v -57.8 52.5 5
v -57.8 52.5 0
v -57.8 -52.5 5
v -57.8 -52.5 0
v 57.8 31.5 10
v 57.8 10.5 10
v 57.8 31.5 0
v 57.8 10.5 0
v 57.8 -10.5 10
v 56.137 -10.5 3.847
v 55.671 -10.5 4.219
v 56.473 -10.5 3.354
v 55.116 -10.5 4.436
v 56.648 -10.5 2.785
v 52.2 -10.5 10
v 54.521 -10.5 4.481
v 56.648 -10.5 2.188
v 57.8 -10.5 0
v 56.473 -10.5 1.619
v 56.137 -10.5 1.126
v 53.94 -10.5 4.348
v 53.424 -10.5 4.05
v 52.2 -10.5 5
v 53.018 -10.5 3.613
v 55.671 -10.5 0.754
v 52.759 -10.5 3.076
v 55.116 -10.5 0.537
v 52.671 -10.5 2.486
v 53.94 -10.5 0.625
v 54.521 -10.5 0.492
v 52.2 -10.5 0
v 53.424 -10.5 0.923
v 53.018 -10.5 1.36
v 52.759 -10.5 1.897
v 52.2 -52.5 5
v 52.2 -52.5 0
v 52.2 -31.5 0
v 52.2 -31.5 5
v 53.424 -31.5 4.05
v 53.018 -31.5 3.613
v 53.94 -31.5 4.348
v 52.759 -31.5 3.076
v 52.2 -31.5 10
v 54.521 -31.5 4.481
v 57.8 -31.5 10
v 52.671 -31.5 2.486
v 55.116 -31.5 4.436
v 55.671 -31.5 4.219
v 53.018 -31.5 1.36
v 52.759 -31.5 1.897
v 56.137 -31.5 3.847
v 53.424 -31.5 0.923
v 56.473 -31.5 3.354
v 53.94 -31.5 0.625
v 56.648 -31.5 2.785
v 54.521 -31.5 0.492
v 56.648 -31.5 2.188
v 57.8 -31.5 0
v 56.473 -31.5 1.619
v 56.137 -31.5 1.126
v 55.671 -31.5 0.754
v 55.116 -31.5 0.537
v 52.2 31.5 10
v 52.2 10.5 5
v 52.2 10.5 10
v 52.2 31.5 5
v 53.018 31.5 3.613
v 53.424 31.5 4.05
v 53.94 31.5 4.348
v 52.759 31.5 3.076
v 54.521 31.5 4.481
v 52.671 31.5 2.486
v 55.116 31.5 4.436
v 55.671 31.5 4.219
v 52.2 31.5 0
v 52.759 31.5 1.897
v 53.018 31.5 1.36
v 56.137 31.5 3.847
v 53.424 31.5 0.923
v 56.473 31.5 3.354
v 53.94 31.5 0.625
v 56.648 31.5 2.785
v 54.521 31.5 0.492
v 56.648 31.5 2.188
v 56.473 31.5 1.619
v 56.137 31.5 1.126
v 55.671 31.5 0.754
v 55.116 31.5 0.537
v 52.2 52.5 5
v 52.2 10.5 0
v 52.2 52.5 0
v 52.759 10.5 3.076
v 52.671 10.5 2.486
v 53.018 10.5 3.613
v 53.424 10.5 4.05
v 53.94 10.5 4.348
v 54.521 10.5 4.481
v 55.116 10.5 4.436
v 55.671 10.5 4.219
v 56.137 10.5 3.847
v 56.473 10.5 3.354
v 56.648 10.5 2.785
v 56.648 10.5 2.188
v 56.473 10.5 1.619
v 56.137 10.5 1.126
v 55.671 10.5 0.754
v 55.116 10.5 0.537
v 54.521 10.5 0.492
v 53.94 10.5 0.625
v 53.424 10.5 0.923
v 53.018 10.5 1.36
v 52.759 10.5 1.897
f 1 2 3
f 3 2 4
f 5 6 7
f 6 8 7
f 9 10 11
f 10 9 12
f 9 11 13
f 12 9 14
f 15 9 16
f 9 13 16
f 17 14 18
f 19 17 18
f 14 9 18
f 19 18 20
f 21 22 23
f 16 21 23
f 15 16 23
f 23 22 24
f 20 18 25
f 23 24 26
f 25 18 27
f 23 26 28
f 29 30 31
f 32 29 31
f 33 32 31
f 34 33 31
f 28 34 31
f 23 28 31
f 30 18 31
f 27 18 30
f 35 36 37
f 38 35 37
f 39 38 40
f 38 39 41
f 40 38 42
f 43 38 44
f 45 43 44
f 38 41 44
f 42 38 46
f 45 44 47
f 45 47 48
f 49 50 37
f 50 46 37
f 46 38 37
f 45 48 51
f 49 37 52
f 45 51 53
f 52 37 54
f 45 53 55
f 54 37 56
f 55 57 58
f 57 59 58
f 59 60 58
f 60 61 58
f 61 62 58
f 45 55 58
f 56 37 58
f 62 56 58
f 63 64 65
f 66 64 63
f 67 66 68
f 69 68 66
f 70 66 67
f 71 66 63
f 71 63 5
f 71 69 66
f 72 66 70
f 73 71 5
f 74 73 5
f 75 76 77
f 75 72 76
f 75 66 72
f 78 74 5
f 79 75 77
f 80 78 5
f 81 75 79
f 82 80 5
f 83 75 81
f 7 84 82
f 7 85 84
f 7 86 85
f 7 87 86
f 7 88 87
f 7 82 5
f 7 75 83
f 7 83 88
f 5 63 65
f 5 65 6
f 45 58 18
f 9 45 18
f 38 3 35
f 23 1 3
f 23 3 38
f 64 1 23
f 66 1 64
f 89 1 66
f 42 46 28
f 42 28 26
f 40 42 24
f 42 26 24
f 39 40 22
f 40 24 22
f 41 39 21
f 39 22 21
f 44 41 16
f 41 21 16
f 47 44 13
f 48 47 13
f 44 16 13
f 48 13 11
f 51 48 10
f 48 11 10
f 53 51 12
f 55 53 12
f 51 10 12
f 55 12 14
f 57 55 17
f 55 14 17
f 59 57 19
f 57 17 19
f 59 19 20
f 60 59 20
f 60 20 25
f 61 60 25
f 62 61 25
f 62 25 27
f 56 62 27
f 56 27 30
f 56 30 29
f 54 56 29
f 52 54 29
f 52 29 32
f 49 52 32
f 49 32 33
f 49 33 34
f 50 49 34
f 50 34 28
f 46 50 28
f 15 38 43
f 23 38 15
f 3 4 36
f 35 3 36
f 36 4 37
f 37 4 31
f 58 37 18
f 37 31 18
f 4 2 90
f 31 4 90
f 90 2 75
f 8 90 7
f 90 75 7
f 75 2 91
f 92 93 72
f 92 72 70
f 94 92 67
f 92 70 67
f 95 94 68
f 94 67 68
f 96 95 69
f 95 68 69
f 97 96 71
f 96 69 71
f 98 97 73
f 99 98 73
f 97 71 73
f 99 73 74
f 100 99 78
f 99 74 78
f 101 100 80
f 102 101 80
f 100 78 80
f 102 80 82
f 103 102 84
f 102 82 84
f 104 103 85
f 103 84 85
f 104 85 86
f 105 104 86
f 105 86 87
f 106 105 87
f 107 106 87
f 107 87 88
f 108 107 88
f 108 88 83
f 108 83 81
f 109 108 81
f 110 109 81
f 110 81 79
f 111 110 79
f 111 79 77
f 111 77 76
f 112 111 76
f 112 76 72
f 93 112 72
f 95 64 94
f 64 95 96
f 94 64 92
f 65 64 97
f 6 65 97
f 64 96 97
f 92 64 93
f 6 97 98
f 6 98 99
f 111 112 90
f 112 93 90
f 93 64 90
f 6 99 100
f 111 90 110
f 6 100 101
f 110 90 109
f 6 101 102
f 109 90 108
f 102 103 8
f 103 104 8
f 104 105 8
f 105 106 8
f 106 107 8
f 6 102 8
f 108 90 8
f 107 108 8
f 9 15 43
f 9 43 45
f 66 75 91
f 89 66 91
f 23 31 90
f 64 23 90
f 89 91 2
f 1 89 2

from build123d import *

# Parameters (mm, degrees)
F1_DEPTH = 5
F3_D     = 4
F4_W     = 5.6
F4_H     = 21
F5_DEPTH = 5


with BuildPart() as f1:
    # F0 (on Top) → F1 (new body)
    with BuildSketch(Plane.XY):
        Polygon((52.2, 31.5), (52.2, 52.5), (-57.8, 52.5), (-57.8, -52.5), (52.2, -52.5), (52.2, -31.5), (57.8, -31.5), (57.8, -10.5), (52.2, -10.5), (52.2, 10.5), (57.8, 10.5), (57.8, 31.5), align=None)
    extrude(amount=F1_DEPTH)

    # F3 (through all)
    with Locations(Plane.XZ.offset(31.5)):
        with Locations((54.670613, 2.486458)):
            Hole(F3_D / 2)

    # F4 (on face) → F5 (join)
    with BuildSketch(Plane.XY.offset(5)):
        with Locations((55, 21)):
            Rectangle(F4_W, F4_H)
        with Locations((55, -21)):
            Rectangle(F4_W, F4_H)
    extrude(amount=F5_DEPTH)


solid = f1.part
